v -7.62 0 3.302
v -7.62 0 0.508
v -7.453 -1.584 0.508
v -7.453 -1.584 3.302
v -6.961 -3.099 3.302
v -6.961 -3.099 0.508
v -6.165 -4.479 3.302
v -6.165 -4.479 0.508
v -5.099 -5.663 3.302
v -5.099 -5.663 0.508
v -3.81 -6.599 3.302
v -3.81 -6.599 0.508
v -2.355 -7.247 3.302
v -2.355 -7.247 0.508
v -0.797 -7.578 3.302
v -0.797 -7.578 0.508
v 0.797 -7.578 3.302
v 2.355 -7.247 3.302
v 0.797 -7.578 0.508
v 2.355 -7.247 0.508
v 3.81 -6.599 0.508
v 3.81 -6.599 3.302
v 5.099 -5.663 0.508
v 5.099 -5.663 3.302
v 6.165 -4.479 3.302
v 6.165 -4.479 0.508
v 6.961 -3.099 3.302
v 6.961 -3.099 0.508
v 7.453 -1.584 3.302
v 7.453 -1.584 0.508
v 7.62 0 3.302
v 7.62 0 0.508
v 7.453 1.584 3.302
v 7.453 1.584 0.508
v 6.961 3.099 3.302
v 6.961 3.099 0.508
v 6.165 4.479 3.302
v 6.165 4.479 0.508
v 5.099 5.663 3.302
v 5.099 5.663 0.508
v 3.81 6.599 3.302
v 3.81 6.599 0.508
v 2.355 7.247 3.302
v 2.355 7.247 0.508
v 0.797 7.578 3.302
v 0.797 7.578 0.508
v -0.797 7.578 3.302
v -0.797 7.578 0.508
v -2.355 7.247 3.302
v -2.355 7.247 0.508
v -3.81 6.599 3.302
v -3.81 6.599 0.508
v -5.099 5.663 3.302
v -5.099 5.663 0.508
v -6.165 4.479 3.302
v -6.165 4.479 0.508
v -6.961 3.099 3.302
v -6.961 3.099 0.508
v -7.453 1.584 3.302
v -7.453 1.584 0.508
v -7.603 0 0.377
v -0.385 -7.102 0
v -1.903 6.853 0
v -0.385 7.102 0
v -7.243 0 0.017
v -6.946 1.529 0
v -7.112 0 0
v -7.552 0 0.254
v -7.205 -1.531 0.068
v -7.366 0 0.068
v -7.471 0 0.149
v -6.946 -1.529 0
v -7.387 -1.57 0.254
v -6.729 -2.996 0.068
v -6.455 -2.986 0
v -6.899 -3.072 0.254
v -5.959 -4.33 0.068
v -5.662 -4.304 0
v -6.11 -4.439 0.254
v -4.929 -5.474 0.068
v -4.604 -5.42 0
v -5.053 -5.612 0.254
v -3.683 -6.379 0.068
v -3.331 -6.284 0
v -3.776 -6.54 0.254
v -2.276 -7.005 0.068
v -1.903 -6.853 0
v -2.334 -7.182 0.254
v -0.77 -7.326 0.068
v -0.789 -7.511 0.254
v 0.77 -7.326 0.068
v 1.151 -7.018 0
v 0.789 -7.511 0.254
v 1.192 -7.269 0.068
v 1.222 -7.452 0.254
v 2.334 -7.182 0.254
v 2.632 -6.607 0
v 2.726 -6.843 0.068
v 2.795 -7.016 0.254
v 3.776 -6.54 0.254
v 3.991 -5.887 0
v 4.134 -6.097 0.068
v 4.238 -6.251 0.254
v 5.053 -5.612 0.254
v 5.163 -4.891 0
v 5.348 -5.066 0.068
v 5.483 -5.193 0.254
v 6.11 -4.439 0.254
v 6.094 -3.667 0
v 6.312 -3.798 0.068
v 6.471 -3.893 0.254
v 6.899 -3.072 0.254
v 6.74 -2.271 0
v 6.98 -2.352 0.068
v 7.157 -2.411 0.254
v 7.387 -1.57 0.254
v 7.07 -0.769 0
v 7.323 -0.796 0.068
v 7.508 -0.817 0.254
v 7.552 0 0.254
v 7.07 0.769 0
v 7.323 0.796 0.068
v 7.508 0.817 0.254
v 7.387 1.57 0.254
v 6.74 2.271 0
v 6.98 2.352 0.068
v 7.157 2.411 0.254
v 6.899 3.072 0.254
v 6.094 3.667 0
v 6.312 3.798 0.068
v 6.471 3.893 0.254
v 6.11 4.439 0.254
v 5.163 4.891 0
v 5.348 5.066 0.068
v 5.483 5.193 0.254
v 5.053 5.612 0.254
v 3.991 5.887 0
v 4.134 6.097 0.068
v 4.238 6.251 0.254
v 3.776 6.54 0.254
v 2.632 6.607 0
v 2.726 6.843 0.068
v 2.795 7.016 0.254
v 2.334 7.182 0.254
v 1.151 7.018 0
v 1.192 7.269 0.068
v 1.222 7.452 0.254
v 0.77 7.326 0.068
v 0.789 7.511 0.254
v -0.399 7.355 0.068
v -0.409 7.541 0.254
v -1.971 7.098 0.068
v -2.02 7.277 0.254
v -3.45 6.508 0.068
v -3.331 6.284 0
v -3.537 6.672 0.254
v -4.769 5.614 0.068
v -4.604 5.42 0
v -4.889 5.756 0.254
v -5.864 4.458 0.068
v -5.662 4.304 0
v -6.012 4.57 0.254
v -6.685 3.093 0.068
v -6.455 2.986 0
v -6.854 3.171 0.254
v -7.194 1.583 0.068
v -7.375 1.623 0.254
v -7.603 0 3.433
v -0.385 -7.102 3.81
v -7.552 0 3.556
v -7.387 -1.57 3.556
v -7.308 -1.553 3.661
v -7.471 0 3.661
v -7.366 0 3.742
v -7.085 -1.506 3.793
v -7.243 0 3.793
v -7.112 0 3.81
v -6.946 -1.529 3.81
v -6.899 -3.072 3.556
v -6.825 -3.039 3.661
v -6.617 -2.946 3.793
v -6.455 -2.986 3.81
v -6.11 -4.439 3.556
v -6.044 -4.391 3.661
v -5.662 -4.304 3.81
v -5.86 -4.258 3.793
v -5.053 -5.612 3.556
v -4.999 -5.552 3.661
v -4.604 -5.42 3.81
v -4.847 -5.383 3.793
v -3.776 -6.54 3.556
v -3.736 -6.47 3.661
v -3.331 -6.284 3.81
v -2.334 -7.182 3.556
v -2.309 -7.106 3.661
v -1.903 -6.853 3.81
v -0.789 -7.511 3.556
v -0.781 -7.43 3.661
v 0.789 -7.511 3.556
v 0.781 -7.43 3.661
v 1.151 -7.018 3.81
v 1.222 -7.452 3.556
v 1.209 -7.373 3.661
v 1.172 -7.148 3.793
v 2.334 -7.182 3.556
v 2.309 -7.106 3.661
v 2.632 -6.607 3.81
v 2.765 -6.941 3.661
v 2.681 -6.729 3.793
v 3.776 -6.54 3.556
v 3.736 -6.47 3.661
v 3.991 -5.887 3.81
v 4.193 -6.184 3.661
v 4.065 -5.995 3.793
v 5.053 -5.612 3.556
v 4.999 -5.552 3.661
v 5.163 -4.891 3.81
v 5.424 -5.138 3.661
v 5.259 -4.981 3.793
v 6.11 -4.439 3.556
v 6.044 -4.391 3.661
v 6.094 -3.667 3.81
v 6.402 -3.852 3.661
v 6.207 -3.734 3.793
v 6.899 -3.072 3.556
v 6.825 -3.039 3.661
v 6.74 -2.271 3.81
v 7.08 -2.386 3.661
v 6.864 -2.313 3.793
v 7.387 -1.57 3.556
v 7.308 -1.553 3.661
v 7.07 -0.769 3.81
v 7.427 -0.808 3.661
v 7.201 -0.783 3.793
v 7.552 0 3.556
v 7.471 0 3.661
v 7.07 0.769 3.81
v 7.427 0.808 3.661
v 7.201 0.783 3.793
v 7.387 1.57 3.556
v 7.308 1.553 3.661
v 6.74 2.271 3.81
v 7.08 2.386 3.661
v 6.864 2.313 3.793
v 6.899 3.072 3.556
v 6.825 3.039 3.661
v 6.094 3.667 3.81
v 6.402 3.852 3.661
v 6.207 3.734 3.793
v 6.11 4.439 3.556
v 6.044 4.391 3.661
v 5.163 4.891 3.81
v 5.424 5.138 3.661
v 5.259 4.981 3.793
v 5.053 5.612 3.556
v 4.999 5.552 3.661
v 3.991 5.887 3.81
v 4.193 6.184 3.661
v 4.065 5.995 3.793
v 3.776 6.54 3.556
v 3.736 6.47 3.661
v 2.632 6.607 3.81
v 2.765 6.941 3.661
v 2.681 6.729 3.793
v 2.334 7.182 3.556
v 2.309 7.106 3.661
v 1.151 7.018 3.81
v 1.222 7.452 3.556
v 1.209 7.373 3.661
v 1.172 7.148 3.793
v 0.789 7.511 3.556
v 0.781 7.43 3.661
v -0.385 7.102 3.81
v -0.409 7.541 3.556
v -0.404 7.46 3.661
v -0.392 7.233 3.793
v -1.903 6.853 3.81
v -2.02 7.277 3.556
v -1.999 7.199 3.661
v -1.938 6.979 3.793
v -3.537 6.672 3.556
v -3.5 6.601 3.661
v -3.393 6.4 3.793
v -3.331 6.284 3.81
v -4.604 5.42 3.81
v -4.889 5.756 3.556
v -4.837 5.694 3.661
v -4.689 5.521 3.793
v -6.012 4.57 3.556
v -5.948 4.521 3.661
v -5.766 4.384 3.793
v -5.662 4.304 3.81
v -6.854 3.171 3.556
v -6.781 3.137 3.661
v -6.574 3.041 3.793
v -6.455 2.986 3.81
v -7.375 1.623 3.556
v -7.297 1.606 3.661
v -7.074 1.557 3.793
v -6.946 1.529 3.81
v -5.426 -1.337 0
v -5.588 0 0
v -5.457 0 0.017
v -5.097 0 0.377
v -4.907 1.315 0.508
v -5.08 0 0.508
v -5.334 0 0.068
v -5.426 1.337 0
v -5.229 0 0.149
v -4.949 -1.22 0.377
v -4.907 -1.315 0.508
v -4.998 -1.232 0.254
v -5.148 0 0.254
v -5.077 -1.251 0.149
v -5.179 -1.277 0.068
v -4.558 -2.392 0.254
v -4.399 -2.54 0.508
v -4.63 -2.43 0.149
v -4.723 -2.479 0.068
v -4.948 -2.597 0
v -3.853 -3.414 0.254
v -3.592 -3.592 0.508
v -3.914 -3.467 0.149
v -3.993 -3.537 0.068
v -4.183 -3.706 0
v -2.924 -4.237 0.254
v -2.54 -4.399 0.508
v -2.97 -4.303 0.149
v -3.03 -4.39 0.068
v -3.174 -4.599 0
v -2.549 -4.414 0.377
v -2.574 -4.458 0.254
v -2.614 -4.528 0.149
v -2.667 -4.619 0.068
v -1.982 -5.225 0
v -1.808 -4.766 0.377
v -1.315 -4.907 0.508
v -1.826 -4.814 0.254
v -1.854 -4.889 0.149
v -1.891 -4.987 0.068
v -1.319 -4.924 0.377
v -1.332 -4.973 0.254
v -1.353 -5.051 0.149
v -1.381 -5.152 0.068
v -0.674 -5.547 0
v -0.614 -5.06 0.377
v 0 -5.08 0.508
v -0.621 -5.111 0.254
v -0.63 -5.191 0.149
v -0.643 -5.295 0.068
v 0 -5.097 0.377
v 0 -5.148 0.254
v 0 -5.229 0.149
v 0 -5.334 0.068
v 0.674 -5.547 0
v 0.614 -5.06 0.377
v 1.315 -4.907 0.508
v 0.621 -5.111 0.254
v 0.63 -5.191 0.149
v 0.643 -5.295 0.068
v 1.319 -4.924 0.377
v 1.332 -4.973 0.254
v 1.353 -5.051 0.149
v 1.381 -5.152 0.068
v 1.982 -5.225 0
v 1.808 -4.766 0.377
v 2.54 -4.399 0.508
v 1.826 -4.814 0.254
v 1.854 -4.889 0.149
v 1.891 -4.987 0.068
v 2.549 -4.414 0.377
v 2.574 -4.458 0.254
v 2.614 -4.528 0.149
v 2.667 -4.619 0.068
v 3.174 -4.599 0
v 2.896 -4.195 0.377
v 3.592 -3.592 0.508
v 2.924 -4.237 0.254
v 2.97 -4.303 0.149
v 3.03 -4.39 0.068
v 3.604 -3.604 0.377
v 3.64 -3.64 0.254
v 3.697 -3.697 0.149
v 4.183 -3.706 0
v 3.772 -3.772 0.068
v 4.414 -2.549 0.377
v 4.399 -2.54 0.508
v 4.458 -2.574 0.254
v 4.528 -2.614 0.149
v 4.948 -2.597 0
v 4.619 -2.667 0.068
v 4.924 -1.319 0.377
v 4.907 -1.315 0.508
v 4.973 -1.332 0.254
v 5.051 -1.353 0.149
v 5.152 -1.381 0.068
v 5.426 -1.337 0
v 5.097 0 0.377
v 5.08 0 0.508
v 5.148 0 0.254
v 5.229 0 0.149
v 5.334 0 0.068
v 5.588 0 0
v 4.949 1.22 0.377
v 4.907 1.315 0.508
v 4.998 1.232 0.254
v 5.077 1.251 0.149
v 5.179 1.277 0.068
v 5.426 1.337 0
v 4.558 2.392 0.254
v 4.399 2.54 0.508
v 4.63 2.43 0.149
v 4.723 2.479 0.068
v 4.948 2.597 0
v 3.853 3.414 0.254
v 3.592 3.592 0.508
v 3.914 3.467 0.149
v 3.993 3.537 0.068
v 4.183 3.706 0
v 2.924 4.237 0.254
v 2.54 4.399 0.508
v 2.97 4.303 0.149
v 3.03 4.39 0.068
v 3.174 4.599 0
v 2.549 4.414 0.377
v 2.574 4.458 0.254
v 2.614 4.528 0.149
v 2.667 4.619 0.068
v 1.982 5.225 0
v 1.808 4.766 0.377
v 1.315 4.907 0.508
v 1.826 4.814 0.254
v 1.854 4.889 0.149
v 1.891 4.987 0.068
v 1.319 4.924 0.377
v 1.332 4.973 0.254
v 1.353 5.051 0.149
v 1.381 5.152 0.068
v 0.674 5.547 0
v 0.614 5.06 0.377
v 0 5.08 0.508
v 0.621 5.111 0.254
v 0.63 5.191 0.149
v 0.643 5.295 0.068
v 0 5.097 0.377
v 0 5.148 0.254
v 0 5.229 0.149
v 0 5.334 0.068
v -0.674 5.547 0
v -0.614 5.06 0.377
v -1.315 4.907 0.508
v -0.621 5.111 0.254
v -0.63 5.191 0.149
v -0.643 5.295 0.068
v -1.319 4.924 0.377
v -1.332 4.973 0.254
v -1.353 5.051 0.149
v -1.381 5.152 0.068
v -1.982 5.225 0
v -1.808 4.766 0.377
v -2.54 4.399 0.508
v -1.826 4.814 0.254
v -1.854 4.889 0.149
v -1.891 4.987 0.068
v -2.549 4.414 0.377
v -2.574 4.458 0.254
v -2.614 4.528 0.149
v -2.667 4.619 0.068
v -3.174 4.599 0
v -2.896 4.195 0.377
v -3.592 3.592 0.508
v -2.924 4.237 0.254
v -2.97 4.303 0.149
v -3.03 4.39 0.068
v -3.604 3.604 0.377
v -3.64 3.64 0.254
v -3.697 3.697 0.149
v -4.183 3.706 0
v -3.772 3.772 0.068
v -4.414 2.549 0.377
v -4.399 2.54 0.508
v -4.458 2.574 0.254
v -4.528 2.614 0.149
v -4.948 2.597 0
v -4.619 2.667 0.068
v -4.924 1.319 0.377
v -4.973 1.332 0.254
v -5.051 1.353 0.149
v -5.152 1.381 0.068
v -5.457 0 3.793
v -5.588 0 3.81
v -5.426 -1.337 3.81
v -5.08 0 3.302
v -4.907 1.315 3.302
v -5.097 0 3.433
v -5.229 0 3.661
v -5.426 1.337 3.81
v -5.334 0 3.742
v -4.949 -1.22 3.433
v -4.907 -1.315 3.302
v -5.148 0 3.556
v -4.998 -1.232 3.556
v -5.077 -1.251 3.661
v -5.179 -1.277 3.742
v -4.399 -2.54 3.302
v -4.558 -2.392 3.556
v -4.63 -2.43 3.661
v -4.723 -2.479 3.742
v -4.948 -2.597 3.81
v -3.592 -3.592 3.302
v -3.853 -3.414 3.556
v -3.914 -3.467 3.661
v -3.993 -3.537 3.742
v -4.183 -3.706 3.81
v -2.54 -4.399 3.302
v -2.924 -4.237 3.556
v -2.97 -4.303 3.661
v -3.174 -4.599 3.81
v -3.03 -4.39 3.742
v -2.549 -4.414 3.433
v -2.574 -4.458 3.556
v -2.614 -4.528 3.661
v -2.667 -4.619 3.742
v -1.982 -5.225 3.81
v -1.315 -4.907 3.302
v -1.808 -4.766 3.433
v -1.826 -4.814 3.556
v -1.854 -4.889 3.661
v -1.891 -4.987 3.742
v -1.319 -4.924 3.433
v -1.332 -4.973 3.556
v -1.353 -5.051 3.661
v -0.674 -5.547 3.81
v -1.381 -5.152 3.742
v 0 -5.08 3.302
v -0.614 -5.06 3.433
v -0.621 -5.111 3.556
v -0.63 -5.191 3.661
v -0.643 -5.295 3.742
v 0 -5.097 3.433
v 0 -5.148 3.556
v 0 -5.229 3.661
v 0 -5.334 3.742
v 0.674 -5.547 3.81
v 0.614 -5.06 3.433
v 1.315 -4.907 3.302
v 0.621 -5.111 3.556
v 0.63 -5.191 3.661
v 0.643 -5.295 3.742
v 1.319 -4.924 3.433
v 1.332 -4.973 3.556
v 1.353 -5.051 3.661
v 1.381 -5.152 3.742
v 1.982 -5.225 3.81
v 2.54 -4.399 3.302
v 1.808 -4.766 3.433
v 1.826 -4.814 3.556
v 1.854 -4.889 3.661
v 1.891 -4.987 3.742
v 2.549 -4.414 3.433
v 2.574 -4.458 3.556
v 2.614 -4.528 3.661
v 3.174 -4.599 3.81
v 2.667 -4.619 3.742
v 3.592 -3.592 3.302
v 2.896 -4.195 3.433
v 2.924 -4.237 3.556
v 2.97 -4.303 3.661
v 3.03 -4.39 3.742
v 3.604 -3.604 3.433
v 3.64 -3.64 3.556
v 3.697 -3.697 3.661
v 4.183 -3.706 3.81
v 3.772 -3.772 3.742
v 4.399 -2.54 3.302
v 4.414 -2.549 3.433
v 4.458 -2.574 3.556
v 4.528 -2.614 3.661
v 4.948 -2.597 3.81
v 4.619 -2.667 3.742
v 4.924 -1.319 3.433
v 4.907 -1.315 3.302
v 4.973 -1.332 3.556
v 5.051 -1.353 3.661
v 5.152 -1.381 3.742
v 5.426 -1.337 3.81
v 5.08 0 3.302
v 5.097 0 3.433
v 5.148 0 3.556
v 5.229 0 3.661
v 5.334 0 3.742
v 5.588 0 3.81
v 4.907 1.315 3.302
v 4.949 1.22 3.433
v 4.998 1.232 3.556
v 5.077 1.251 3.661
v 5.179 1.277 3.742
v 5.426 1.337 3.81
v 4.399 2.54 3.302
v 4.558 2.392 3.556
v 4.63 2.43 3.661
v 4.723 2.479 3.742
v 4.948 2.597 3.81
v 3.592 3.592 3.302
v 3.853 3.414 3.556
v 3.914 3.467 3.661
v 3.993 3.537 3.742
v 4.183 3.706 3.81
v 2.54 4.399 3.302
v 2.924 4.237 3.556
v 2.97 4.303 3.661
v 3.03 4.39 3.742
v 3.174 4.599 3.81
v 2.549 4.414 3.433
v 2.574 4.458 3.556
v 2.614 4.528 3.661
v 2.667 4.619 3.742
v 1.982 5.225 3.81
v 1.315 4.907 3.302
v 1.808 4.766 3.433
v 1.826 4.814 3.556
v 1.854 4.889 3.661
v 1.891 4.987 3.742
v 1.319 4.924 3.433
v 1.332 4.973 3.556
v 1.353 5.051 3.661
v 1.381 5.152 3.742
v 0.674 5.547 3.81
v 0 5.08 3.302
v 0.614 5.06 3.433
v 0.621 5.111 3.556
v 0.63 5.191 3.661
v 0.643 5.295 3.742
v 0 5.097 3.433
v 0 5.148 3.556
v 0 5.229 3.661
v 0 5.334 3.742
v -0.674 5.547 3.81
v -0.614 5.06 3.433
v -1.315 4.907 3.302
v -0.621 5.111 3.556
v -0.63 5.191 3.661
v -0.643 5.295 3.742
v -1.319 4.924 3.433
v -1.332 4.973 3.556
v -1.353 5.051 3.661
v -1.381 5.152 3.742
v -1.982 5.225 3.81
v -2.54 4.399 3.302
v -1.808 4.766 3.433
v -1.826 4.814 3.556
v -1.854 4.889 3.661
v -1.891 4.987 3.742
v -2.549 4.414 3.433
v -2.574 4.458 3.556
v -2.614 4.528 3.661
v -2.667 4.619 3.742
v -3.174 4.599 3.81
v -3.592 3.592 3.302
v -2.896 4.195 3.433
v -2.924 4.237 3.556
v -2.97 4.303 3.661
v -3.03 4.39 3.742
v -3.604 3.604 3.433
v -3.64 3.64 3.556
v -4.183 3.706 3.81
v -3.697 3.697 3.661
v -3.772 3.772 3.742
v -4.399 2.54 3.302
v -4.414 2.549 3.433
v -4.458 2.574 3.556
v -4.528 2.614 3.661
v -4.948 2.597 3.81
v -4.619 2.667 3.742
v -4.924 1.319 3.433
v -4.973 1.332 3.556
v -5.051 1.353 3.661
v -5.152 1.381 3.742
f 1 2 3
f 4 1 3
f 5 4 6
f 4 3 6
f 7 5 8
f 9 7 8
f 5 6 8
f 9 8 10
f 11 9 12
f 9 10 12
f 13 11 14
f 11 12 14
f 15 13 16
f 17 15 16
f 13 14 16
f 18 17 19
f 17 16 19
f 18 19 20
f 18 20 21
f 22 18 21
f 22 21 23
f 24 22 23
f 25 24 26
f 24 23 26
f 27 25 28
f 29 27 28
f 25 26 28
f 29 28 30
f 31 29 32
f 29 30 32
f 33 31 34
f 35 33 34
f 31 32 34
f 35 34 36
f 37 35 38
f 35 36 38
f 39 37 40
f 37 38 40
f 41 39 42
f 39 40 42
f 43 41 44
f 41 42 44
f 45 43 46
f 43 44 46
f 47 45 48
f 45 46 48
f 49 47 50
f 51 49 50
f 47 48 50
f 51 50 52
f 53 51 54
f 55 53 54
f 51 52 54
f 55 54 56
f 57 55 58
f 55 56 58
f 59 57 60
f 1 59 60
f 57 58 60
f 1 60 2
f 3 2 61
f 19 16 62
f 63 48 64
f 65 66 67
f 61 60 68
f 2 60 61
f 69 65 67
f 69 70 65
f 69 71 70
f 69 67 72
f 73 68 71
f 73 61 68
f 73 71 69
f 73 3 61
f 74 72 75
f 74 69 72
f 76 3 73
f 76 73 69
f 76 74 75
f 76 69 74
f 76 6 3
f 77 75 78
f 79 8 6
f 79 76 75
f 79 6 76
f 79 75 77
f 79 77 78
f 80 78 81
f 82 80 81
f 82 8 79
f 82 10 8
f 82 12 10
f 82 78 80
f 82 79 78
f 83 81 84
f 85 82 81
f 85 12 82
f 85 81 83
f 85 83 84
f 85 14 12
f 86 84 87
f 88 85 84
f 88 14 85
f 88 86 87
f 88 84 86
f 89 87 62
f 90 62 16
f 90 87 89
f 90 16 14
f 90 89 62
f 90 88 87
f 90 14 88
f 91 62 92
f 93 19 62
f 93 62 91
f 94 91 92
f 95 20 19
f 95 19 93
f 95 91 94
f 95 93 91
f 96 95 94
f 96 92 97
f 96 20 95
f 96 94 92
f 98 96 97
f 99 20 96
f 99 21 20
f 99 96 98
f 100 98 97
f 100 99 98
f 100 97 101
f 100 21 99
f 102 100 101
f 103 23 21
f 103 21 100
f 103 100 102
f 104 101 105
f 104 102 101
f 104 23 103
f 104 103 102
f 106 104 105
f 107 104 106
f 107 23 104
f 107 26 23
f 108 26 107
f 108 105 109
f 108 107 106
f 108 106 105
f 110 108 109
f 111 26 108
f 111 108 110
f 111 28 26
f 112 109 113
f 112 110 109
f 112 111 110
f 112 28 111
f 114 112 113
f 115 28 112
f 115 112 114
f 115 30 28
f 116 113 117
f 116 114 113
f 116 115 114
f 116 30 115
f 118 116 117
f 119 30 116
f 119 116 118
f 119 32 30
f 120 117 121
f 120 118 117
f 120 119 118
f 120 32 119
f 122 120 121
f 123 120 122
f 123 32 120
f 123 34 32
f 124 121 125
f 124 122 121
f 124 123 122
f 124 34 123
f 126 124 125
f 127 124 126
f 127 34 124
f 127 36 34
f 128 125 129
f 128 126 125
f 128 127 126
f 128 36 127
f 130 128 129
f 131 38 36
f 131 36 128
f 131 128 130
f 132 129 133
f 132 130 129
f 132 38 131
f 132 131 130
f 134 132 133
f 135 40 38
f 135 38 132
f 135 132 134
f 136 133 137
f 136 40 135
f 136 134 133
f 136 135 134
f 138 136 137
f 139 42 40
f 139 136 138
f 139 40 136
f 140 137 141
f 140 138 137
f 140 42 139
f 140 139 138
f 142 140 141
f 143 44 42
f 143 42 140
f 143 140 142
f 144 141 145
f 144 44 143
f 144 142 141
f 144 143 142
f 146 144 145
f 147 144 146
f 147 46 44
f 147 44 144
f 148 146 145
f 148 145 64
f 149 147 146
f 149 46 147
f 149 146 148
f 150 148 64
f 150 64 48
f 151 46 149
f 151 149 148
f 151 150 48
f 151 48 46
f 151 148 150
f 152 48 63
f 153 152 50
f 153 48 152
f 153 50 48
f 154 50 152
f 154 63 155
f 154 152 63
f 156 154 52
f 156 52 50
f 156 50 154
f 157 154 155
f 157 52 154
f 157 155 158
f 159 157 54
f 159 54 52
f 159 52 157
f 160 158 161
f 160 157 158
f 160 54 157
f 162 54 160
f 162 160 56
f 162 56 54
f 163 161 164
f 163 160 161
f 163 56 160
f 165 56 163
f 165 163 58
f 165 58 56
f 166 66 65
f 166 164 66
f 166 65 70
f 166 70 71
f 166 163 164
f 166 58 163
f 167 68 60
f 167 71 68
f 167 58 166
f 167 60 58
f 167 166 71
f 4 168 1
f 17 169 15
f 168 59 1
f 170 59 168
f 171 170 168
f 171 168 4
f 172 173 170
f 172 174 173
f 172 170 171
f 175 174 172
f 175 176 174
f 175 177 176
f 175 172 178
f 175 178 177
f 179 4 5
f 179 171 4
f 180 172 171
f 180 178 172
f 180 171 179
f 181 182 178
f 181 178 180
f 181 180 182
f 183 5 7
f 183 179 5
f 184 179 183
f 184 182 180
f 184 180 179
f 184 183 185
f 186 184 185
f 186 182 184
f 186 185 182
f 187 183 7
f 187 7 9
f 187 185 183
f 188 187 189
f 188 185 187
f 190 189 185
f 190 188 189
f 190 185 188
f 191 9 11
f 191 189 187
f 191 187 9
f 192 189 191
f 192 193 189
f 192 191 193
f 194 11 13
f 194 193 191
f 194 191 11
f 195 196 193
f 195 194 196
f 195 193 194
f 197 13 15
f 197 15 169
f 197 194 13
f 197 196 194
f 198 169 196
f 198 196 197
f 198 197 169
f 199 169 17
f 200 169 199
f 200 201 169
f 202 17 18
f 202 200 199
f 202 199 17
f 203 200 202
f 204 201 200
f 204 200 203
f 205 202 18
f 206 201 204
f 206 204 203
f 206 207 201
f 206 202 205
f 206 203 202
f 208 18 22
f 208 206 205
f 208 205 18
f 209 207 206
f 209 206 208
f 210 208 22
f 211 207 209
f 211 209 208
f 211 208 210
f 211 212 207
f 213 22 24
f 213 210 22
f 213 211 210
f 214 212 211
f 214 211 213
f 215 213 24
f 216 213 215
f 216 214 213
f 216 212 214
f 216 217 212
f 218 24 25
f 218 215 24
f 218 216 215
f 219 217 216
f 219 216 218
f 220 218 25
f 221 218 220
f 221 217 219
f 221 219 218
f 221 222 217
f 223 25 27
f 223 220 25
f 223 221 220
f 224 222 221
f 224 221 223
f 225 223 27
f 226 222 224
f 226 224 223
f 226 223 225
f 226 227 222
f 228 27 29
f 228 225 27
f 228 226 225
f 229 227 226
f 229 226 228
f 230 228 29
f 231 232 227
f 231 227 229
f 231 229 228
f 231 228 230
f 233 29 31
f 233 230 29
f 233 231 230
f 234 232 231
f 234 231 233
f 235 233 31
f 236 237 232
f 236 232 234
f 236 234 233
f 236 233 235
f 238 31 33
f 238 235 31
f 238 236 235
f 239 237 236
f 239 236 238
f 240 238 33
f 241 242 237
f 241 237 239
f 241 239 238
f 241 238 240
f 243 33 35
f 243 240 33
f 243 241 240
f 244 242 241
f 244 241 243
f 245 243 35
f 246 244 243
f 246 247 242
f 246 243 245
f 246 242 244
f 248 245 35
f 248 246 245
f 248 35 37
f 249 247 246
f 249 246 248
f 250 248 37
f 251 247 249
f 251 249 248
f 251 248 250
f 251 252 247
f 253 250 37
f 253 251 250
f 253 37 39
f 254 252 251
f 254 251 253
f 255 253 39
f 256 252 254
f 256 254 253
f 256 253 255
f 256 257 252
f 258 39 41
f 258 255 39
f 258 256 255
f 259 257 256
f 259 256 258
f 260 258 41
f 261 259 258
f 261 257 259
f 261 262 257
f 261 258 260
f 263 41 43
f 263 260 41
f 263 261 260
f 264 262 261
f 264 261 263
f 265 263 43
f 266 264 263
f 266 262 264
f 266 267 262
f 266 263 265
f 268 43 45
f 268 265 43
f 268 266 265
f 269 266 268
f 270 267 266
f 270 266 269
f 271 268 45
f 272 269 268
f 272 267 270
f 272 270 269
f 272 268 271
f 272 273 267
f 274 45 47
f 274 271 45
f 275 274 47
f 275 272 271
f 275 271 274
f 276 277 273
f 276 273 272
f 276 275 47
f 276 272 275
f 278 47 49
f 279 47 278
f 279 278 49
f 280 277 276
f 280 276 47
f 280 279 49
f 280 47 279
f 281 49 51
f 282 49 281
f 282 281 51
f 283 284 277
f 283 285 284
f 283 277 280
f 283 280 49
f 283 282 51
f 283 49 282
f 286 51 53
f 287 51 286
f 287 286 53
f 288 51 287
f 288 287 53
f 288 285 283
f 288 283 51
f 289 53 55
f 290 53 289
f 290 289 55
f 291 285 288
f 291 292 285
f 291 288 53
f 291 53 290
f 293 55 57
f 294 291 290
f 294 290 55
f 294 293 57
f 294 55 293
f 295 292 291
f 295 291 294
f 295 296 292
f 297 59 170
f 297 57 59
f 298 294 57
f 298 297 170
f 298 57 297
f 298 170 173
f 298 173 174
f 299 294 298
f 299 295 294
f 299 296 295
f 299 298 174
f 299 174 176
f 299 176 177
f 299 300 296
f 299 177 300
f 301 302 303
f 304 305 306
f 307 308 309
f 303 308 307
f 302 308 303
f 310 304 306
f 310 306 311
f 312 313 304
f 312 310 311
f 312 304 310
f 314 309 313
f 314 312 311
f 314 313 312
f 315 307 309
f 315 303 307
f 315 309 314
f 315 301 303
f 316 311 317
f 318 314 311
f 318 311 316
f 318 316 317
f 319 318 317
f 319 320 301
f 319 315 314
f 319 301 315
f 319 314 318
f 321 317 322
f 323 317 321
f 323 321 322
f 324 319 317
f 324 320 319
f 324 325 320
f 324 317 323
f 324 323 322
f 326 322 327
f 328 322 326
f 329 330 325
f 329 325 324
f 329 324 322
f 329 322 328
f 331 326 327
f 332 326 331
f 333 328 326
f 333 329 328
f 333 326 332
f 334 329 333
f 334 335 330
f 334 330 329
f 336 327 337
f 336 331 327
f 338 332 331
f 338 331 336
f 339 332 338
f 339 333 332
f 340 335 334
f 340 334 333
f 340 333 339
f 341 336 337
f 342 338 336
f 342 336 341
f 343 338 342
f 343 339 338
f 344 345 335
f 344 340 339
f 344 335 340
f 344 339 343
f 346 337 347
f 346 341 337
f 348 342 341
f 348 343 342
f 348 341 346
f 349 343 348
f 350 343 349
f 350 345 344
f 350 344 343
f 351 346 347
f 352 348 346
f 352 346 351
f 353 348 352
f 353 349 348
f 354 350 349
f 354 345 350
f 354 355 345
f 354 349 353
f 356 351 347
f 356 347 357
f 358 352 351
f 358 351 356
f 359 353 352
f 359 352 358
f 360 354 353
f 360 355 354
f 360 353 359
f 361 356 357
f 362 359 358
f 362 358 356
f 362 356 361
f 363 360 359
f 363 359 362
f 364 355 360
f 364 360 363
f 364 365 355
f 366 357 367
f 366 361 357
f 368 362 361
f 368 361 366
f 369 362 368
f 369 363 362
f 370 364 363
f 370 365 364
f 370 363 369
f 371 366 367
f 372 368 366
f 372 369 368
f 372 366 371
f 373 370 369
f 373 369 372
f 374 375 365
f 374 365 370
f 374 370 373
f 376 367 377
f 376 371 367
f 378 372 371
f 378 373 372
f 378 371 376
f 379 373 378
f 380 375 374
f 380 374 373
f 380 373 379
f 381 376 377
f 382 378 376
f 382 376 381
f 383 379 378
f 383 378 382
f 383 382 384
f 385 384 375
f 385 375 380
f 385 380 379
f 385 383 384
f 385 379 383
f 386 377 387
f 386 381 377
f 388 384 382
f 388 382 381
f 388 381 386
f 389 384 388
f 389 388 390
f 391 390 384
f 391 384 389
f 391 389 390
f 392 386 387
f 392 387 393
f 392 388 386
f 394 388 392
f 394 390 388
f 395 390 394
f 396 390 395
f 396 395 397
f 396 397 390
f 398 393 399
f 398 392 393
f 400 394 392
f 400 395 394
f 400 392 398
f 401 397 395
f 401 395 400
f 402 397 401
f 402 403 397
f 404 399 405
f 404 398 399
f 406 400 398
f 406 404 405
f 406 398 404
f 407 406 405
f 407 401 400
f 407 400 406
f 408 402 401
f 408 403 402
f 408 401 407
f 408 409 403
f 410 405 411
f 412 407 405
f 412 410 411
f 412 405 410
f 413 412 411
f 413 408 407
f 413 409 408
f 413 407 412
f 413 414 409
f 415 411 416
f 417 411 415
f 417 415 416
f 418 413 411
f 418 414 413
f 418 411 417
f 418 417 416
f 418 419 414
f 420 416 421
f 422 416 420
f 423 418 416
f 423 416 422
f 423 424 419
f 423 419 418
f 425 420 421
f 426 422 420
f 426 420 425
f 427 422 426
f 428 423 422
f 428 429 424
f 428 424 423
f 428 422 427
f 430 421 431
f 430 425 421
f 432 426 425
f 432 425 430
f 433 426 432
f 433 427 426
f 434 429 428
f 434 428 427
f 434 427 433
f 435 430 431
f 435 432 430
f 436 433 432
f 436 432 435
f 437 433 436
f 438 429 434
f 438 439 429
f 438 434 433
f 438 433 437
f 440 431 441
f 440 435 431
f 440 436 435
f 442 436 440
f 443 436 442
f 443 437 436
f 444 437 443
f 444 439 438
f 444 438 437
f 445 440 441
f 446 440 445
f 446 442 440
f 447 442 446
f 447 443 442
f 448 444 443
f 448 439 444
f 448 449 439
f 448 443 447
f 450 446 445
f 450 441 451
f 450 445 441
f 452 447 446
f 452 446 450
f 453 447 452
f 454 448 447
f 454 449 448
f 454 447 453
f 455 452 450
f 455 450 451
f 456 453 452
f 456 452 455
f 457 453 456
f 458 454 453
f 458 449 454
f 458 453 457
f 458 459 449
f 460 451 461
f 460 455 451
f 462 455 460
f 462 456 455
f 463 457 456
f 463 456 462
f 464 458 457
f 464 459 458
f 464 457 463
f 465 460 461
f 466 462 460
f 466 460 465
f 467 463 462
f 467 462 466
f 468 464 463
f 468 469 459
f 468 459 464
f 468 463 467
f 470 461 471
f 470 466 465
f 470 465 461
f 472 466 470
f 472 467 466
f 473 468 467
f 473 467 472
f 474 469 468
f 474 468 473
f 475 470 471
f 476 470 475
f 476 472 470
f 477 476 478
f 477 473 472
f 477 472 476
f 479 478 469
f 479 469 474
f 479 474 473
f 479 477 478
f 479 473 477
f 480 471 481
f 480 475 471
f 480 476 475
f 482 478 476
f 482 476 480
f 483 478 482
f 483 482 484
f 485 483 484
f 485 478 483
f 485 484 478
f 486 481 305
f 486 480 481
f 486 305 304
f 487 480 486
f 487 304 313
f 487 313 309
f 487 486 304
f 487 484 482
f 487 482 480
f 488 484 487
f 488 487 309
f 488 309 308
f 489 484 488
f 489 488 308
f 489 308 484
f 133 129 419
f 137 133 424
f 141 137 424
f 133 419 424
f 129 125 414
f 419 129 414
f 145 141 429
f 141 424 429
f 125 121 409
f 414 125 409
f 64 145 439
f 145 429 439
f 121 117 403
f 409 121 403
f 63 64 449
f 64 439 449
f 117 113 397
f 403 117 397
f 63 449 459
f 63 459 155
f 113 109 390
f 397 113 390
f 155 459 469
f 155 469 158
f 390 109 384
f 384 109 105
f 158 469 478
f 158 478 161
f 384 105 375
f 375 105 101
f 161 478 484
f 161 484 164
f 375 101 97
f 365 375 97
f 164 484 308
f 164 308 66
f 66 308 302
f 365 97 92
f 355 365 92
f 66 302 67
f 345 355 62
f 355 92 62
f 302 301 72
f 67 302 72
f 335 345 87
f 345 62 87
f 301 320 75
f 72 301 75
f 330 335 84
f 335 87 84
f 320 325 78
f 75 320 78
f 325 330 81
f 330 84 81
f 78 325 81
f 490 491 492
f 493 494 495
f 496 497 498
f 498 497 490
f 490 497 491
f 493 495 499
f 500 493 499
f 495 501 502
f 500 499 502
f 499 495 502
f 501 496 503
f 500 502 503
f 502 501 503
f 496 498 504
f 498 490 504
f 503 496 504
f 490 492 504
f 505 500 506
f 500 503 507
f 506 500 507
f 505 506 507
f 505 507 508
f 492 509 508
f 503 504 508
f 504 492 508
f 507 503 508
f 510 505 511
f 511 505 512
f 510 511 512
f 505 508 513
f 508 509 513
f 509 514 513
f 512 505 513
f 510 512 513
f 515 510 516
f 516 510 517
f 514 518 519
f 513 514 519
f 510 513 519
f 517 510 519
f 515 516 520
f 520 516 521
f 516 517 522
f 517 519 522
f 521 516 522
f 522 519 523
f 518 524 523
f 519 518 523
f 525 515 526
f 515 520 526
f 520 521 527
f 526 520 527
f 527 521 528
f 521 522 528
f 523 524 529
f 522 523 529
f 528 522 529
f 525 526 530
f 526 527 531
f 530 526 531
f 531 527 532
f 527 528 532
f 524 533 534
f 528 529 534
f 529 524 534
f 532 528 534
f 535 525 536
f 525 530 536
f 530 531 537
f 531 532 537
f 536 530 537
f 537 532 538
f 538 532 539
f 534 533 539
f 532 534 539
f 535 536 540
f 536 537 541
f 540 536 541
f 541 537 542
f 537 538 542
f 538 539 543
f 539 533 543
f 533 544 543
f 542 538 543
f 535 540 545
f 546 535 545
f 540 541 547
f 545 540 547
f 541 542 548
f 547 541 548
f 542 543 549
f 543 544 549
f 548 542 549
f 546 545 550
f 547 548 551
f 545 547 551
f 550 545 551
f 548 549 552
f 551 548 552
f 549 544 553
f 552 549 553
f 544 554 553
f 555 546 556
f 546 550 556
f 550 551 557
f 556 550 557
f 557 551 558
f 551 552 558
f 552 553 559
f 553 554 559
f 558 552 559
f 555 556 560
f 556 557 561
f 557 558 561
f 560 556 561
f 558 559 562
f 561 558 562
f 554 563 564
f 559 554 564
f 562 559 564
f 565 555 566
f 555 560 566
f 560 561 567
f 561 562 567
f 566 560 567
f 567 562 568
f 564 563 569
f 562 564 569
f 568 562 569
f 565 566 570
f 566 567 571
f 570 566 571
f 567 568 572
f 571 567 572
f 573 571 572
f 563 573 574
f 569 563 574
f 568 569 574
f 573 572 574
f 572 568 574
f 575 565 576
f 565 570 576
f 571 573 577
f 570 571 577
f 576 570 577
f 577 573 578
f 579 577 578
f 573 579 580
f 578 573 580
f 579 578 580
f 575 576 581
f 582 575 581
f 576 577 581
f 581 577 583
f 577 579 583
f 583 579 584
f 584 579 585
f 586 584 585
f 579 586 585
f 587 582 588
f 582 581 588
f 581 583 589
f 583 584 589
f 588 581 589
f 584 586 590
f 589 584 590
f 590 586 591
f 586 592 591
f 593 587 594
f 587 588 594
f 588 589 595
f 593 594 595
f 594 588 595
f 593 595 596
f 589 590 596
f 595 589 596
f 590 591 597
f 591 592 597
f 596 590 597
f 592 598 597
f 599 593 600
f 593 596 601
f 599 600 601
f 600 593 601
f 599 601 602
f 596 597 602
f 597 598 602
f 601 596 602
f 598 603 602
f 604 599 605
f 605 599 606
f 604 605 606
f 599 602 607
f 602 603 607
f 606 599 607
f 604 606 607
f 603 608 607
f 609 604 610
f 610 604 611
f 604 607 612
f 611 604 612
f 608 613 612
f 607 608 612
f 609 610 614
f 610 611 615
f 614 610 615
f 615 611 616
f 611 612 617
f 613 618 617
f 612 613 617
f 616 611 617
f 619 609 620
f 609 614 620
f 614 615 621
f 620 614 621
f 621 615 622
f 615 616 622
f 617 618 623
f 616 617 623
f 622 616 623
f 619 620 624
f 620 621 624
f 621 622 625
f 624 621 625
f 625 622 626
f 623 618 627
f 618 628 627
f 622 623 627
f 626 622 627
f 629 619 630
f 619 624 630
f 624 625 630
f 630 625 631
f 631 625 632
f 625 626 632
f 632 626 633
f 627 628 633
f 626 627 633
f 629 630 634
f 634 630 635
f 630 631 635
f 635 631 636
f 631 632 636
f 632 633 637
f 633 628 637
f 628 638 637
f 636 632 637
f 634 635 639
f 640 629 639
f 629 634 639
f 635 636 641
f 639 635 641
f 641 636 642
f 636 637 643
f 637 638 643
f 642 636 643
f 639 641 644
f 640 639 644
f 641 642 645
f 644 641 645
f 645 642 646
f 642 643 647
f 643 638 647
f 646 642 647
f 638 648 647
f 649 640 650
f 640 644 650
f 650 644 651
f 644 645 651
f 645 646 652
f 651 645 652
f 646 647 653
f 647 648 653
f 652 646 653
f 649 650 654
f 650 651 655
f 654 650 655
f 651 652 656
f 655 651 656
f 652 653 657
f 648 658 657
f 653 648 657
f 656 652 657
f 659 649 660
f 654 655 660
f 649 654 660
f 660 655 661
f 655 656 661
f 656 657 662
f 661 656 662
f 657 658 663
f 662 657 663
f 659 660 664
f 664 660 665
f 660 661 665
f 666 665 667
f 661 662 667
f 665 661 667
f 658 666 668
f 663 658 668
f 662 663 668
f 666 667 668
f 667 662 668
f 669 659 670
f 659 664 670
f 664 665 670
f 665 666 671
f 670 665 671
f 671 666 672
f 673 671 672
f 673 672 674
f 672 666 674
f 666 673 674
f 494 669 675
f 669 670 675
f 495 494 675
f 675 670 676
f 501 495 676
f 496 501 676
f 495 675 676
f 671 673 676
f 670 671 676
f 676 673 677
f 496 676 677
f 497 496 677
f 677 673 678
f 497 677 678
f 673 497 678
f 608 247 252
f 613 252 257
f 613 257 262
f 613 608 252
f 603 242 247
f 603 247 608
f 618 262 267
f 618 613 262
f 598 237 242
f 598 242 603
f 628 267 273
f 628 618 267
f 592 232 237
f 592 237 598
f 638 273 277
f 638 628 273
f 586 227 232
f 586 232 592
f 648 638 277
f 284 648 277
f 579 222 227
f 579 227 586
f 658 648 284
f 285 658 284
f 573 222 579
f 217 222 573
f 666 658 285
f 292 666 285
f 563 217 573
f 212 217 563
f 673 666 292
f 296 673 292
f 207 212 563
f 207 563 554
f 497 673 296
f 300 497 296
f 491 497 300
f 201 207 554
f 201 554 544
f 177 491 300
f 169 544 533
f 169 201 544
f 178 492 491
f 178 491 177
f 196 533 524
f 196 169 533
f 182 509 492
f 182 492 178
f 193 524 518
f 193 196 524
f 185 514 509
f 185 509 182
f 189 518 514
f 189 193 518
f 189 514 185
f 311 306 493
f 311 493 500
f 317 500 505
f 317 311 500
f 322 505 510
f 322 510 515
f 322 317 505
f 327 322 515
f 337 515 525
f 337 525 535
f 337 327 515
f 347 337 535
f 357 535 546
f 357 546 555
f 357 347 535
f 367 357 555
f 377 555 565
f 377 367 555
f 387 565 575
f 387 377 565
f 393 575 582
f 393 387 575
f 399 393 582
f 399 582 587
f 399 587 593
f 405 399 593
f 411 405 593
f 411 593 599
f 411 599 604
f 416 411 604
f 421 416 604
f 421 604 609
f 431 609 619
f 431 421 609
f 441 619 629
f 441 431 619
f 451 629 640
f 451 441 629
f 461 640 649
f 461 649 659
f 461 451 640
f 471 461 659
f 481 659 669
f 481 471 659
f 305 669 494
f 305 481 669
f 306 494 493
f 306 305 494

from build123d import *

# Parameters (mm, degrees)
SKETCH2_R           = 7.62
SKETCH2_R_2         = 5.08
BOSS_EXTRUDE1_DEPTH = 3.81
FILLET1_R           = 0.508
FILLET2_R           = 0.508
FILLET3_R           = 0.508
FILLET4_R           = 0.508


with BuildPart() as part:
    # Sketch2 → Boss-Extrude1 (new body)
    with BuildSketch(Plane.XY):
        with Locations(Location((0, 0, 0), (0, 0, 180))):
            Circle(SKETCH2_R)
        with Locations(Location((0, 0, 0), (0, 0, 180))):
            Circle(SKETCH2_R_2, mode=Mode.SUBTRACT)
    extrude(amount=BOSS_EXTRUDE1_DEPTH)

    # Fillet1
    fillet1_edges = [part.edges().sort_by_distance(p)[0] for p in [
        (5.08, 0, 3.81),
    ]]
    fillet(fillet1_edges, radius=FILLET1_R)

    # Fillet2
    fillet2_edges = [part.edges().sort_by_distance(p)[0] for p in [
        (5.08, 0, 0),
    ]]
    fillet(fillet2_edges, radius=FILLET2_R)

    # Fillet3
    fillet3_edges = [part.edges().sort_by_distance(p)[0] for p in [
        (7.62, 0, 0),
    ]]
    fillet(fillet3_edges, radius=FILLET3_R)

    # Fillet4
    fillet4_edges = [part.edges().sort_by_distance(p)[0] for p in [
        (7.62, 0, 3.81),
    ]]
    fillet(fillet4_edges, radius=FILLET4_R)


solid = part.part
